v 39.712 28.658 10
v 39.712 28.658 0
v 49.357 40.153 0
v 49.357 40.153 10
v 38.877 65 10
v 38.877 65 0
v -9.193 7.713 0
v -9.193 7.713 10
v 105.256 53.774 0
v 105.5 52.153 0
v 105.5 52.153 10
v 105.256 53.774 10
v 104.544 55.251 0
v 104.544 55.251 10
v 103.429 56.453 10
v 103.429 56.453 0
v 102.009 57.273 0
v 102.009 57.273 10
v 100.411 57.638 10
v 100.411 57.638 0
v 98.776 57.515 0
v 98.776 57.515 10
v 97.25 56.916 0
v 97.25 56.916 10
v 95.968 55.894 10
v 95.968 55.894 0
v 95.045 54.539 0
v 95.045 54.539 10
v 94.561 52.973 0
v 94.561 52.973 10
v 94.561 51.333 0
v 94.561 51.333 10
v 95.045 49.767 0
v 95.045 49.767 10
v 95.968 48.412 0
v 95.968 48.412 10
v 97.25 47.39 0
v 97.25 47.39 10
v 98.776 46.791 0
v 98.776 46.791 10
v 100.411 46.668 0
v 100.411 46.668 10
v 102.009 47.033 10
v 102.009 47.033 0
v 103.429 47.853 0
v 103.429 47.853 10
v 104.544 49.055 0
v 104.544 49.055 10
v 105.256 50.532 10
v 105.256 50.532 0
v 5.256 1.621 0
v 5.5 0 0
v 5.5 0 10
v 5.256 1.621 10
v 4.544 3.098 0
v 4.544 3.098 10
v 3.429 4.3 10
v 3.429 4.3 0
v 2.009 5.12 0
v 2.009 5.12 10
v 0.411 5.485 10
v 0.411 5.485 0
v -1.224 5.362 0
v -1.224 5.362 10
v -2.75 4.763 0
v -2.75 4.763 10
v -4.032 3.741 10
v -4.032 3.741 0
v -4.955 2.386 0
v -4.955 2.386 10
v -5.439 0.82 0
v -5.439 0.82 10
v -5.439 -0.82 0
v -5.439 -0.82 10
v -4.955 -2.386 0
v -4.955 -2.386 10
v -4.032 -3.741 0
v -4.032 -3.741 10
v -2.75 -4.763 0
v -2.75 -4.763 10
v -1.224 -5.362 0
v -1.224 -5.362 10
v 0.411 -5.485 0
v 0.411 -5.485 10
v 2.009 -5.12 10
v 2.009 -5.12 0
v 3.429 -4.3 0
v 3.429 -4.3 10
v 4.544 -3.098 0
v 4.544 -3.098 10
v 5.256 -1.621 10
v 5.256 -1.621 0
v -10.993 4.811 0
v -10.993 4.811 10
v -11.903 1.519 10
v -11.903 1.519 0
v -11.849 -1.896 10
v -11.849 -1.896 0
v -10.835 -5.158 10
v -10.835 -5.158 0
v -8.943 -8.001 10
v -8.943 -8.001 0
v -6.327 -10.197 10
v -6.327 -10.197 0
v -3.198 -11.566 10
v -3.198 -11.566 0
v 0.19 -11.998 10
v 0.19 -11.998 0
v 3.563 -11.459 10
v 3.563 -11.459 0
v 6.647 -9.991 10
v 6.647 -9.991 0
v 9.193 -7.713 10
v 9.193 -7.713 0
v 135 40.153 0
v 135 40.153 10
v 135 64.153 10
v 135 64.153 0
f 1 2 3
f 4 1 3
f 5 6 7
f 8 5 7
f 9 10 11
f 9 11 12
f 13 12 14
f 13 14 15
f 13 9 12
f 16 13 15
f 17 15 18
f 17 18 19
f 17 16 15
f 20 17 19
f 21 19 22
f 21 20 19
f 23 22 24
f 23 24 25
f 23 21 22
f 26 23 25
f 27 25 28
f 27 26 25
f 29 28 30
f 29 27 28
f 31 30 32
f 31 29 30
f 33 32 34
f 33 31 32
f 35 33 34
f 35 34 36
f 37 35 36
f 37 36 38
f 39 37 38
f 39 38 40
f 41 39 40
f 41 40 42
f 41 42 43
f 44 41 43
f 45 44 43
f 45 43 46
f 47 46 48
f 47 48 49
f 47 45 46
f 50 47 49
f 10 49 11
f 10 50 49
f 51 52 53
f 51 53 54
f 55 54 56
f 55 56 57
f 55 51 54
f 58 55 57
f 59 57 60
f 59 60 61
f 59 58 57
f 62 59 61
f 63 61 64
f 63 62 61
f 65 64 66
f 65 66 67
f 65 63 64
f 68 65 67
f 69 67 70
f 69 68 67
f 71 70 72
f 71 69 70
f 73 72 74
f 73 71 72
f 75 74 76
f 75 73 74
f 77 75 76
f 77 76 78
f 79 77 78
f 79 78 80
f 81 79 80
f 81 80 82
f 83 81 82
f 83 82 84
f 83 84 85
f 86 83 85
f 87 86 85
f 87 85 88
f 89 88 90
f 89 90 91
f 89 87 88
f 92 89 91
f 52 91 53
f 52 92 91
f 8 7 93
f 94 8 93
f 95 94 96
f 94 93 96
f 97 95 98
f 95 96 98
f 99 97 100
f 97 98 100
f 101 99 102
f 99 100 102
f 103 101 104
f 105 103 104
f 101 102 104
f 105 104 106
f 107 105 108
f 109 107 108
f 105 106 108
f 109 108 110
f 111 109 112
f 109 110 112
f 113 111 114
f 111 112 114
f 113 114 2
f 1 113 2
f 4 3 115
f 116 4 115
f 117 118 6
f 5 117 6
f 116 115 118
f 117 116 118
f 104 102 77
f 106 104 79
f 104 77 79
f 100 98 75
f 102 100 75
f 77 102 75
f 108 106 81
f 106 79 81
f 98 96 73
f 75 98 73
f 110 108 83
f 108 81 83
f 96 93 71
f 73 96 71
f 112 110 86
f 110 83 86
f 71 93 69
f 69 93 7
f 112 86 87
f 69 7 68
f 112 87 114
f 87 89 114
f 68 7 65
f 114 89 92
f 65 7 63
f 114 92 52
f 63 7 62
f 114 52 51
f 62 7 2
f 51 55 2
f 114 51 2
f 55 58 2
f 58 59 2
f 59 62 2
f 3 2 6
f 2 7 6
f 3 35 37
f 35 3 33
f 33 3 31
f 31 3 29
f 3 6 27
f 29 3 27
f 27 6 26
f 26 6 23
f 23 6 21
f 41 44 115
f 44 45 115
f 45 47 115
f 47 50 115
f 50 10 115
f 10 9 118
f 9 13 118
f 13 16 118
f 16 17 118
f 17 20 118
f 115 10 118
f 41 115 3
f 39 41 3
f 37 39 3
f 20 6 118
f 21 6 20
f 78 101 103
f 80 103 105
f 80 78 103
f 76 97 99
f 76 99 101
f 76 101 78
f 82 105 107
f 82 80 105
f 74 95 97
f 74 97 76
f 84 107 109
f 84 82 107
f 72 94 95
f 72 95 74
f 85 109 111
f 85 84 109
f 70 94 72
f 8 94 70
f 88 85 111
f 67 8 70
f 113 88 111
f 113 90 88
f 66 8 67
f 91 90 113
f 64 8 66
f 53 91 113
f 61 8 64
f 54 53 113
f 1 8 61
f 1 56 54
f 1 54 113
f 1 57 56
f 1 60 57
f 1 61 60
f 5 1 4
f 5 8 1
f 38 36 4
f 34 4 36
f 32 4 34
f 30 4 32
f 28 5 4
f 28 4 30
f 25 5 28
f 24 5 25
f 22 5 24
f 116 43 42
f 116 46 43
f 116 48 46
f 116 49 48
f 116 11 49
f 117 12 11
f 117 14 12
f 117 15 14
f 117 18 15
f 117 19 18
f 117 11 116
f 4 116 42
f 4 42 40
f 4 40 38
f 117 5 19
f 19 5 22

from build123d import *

# Parameters (mm, degrees)
SKETCH1_R           = 5.5
BOSS_EXTRUDE1_DEPTH = 10


with BuildPart() as part:
    # Sketch1 → Boss-Extrude1 (new body)
    with BuildSketch(Plane.XY):
        with BuildLine():
            Line((9.192533317, -7.713451316), (39.711607161, 28.65776458))
            Line((39.711607161, 28.65776458), (49.357211477, 40.152948176))
            Line((49.357211477, 40.152948176), (135, 40.152948176))
            Line((135, 40.152948176), (135, 64.152948176))
            Line((135, 64.152948176), (38.876588555, 65))
            Line((38.876588555, 65), (-9.192533317, 7.713451316))
            ThreePointArc((-9.192533317, 7.713451316), (-7.713451316, -9.192533317), (9.192533317, -7.713451316))
        make_face()
        Circle(SKETCH1_R, mode=Mode.SUBTRACT)
        with Locations((100, 52.152948176)):
            Circle(SKETCH1_R, mode=Mode.SUBTRACT)
    extrude(amount=BOSS_EXTRUDE1_DEPTH)


solid = part.part
